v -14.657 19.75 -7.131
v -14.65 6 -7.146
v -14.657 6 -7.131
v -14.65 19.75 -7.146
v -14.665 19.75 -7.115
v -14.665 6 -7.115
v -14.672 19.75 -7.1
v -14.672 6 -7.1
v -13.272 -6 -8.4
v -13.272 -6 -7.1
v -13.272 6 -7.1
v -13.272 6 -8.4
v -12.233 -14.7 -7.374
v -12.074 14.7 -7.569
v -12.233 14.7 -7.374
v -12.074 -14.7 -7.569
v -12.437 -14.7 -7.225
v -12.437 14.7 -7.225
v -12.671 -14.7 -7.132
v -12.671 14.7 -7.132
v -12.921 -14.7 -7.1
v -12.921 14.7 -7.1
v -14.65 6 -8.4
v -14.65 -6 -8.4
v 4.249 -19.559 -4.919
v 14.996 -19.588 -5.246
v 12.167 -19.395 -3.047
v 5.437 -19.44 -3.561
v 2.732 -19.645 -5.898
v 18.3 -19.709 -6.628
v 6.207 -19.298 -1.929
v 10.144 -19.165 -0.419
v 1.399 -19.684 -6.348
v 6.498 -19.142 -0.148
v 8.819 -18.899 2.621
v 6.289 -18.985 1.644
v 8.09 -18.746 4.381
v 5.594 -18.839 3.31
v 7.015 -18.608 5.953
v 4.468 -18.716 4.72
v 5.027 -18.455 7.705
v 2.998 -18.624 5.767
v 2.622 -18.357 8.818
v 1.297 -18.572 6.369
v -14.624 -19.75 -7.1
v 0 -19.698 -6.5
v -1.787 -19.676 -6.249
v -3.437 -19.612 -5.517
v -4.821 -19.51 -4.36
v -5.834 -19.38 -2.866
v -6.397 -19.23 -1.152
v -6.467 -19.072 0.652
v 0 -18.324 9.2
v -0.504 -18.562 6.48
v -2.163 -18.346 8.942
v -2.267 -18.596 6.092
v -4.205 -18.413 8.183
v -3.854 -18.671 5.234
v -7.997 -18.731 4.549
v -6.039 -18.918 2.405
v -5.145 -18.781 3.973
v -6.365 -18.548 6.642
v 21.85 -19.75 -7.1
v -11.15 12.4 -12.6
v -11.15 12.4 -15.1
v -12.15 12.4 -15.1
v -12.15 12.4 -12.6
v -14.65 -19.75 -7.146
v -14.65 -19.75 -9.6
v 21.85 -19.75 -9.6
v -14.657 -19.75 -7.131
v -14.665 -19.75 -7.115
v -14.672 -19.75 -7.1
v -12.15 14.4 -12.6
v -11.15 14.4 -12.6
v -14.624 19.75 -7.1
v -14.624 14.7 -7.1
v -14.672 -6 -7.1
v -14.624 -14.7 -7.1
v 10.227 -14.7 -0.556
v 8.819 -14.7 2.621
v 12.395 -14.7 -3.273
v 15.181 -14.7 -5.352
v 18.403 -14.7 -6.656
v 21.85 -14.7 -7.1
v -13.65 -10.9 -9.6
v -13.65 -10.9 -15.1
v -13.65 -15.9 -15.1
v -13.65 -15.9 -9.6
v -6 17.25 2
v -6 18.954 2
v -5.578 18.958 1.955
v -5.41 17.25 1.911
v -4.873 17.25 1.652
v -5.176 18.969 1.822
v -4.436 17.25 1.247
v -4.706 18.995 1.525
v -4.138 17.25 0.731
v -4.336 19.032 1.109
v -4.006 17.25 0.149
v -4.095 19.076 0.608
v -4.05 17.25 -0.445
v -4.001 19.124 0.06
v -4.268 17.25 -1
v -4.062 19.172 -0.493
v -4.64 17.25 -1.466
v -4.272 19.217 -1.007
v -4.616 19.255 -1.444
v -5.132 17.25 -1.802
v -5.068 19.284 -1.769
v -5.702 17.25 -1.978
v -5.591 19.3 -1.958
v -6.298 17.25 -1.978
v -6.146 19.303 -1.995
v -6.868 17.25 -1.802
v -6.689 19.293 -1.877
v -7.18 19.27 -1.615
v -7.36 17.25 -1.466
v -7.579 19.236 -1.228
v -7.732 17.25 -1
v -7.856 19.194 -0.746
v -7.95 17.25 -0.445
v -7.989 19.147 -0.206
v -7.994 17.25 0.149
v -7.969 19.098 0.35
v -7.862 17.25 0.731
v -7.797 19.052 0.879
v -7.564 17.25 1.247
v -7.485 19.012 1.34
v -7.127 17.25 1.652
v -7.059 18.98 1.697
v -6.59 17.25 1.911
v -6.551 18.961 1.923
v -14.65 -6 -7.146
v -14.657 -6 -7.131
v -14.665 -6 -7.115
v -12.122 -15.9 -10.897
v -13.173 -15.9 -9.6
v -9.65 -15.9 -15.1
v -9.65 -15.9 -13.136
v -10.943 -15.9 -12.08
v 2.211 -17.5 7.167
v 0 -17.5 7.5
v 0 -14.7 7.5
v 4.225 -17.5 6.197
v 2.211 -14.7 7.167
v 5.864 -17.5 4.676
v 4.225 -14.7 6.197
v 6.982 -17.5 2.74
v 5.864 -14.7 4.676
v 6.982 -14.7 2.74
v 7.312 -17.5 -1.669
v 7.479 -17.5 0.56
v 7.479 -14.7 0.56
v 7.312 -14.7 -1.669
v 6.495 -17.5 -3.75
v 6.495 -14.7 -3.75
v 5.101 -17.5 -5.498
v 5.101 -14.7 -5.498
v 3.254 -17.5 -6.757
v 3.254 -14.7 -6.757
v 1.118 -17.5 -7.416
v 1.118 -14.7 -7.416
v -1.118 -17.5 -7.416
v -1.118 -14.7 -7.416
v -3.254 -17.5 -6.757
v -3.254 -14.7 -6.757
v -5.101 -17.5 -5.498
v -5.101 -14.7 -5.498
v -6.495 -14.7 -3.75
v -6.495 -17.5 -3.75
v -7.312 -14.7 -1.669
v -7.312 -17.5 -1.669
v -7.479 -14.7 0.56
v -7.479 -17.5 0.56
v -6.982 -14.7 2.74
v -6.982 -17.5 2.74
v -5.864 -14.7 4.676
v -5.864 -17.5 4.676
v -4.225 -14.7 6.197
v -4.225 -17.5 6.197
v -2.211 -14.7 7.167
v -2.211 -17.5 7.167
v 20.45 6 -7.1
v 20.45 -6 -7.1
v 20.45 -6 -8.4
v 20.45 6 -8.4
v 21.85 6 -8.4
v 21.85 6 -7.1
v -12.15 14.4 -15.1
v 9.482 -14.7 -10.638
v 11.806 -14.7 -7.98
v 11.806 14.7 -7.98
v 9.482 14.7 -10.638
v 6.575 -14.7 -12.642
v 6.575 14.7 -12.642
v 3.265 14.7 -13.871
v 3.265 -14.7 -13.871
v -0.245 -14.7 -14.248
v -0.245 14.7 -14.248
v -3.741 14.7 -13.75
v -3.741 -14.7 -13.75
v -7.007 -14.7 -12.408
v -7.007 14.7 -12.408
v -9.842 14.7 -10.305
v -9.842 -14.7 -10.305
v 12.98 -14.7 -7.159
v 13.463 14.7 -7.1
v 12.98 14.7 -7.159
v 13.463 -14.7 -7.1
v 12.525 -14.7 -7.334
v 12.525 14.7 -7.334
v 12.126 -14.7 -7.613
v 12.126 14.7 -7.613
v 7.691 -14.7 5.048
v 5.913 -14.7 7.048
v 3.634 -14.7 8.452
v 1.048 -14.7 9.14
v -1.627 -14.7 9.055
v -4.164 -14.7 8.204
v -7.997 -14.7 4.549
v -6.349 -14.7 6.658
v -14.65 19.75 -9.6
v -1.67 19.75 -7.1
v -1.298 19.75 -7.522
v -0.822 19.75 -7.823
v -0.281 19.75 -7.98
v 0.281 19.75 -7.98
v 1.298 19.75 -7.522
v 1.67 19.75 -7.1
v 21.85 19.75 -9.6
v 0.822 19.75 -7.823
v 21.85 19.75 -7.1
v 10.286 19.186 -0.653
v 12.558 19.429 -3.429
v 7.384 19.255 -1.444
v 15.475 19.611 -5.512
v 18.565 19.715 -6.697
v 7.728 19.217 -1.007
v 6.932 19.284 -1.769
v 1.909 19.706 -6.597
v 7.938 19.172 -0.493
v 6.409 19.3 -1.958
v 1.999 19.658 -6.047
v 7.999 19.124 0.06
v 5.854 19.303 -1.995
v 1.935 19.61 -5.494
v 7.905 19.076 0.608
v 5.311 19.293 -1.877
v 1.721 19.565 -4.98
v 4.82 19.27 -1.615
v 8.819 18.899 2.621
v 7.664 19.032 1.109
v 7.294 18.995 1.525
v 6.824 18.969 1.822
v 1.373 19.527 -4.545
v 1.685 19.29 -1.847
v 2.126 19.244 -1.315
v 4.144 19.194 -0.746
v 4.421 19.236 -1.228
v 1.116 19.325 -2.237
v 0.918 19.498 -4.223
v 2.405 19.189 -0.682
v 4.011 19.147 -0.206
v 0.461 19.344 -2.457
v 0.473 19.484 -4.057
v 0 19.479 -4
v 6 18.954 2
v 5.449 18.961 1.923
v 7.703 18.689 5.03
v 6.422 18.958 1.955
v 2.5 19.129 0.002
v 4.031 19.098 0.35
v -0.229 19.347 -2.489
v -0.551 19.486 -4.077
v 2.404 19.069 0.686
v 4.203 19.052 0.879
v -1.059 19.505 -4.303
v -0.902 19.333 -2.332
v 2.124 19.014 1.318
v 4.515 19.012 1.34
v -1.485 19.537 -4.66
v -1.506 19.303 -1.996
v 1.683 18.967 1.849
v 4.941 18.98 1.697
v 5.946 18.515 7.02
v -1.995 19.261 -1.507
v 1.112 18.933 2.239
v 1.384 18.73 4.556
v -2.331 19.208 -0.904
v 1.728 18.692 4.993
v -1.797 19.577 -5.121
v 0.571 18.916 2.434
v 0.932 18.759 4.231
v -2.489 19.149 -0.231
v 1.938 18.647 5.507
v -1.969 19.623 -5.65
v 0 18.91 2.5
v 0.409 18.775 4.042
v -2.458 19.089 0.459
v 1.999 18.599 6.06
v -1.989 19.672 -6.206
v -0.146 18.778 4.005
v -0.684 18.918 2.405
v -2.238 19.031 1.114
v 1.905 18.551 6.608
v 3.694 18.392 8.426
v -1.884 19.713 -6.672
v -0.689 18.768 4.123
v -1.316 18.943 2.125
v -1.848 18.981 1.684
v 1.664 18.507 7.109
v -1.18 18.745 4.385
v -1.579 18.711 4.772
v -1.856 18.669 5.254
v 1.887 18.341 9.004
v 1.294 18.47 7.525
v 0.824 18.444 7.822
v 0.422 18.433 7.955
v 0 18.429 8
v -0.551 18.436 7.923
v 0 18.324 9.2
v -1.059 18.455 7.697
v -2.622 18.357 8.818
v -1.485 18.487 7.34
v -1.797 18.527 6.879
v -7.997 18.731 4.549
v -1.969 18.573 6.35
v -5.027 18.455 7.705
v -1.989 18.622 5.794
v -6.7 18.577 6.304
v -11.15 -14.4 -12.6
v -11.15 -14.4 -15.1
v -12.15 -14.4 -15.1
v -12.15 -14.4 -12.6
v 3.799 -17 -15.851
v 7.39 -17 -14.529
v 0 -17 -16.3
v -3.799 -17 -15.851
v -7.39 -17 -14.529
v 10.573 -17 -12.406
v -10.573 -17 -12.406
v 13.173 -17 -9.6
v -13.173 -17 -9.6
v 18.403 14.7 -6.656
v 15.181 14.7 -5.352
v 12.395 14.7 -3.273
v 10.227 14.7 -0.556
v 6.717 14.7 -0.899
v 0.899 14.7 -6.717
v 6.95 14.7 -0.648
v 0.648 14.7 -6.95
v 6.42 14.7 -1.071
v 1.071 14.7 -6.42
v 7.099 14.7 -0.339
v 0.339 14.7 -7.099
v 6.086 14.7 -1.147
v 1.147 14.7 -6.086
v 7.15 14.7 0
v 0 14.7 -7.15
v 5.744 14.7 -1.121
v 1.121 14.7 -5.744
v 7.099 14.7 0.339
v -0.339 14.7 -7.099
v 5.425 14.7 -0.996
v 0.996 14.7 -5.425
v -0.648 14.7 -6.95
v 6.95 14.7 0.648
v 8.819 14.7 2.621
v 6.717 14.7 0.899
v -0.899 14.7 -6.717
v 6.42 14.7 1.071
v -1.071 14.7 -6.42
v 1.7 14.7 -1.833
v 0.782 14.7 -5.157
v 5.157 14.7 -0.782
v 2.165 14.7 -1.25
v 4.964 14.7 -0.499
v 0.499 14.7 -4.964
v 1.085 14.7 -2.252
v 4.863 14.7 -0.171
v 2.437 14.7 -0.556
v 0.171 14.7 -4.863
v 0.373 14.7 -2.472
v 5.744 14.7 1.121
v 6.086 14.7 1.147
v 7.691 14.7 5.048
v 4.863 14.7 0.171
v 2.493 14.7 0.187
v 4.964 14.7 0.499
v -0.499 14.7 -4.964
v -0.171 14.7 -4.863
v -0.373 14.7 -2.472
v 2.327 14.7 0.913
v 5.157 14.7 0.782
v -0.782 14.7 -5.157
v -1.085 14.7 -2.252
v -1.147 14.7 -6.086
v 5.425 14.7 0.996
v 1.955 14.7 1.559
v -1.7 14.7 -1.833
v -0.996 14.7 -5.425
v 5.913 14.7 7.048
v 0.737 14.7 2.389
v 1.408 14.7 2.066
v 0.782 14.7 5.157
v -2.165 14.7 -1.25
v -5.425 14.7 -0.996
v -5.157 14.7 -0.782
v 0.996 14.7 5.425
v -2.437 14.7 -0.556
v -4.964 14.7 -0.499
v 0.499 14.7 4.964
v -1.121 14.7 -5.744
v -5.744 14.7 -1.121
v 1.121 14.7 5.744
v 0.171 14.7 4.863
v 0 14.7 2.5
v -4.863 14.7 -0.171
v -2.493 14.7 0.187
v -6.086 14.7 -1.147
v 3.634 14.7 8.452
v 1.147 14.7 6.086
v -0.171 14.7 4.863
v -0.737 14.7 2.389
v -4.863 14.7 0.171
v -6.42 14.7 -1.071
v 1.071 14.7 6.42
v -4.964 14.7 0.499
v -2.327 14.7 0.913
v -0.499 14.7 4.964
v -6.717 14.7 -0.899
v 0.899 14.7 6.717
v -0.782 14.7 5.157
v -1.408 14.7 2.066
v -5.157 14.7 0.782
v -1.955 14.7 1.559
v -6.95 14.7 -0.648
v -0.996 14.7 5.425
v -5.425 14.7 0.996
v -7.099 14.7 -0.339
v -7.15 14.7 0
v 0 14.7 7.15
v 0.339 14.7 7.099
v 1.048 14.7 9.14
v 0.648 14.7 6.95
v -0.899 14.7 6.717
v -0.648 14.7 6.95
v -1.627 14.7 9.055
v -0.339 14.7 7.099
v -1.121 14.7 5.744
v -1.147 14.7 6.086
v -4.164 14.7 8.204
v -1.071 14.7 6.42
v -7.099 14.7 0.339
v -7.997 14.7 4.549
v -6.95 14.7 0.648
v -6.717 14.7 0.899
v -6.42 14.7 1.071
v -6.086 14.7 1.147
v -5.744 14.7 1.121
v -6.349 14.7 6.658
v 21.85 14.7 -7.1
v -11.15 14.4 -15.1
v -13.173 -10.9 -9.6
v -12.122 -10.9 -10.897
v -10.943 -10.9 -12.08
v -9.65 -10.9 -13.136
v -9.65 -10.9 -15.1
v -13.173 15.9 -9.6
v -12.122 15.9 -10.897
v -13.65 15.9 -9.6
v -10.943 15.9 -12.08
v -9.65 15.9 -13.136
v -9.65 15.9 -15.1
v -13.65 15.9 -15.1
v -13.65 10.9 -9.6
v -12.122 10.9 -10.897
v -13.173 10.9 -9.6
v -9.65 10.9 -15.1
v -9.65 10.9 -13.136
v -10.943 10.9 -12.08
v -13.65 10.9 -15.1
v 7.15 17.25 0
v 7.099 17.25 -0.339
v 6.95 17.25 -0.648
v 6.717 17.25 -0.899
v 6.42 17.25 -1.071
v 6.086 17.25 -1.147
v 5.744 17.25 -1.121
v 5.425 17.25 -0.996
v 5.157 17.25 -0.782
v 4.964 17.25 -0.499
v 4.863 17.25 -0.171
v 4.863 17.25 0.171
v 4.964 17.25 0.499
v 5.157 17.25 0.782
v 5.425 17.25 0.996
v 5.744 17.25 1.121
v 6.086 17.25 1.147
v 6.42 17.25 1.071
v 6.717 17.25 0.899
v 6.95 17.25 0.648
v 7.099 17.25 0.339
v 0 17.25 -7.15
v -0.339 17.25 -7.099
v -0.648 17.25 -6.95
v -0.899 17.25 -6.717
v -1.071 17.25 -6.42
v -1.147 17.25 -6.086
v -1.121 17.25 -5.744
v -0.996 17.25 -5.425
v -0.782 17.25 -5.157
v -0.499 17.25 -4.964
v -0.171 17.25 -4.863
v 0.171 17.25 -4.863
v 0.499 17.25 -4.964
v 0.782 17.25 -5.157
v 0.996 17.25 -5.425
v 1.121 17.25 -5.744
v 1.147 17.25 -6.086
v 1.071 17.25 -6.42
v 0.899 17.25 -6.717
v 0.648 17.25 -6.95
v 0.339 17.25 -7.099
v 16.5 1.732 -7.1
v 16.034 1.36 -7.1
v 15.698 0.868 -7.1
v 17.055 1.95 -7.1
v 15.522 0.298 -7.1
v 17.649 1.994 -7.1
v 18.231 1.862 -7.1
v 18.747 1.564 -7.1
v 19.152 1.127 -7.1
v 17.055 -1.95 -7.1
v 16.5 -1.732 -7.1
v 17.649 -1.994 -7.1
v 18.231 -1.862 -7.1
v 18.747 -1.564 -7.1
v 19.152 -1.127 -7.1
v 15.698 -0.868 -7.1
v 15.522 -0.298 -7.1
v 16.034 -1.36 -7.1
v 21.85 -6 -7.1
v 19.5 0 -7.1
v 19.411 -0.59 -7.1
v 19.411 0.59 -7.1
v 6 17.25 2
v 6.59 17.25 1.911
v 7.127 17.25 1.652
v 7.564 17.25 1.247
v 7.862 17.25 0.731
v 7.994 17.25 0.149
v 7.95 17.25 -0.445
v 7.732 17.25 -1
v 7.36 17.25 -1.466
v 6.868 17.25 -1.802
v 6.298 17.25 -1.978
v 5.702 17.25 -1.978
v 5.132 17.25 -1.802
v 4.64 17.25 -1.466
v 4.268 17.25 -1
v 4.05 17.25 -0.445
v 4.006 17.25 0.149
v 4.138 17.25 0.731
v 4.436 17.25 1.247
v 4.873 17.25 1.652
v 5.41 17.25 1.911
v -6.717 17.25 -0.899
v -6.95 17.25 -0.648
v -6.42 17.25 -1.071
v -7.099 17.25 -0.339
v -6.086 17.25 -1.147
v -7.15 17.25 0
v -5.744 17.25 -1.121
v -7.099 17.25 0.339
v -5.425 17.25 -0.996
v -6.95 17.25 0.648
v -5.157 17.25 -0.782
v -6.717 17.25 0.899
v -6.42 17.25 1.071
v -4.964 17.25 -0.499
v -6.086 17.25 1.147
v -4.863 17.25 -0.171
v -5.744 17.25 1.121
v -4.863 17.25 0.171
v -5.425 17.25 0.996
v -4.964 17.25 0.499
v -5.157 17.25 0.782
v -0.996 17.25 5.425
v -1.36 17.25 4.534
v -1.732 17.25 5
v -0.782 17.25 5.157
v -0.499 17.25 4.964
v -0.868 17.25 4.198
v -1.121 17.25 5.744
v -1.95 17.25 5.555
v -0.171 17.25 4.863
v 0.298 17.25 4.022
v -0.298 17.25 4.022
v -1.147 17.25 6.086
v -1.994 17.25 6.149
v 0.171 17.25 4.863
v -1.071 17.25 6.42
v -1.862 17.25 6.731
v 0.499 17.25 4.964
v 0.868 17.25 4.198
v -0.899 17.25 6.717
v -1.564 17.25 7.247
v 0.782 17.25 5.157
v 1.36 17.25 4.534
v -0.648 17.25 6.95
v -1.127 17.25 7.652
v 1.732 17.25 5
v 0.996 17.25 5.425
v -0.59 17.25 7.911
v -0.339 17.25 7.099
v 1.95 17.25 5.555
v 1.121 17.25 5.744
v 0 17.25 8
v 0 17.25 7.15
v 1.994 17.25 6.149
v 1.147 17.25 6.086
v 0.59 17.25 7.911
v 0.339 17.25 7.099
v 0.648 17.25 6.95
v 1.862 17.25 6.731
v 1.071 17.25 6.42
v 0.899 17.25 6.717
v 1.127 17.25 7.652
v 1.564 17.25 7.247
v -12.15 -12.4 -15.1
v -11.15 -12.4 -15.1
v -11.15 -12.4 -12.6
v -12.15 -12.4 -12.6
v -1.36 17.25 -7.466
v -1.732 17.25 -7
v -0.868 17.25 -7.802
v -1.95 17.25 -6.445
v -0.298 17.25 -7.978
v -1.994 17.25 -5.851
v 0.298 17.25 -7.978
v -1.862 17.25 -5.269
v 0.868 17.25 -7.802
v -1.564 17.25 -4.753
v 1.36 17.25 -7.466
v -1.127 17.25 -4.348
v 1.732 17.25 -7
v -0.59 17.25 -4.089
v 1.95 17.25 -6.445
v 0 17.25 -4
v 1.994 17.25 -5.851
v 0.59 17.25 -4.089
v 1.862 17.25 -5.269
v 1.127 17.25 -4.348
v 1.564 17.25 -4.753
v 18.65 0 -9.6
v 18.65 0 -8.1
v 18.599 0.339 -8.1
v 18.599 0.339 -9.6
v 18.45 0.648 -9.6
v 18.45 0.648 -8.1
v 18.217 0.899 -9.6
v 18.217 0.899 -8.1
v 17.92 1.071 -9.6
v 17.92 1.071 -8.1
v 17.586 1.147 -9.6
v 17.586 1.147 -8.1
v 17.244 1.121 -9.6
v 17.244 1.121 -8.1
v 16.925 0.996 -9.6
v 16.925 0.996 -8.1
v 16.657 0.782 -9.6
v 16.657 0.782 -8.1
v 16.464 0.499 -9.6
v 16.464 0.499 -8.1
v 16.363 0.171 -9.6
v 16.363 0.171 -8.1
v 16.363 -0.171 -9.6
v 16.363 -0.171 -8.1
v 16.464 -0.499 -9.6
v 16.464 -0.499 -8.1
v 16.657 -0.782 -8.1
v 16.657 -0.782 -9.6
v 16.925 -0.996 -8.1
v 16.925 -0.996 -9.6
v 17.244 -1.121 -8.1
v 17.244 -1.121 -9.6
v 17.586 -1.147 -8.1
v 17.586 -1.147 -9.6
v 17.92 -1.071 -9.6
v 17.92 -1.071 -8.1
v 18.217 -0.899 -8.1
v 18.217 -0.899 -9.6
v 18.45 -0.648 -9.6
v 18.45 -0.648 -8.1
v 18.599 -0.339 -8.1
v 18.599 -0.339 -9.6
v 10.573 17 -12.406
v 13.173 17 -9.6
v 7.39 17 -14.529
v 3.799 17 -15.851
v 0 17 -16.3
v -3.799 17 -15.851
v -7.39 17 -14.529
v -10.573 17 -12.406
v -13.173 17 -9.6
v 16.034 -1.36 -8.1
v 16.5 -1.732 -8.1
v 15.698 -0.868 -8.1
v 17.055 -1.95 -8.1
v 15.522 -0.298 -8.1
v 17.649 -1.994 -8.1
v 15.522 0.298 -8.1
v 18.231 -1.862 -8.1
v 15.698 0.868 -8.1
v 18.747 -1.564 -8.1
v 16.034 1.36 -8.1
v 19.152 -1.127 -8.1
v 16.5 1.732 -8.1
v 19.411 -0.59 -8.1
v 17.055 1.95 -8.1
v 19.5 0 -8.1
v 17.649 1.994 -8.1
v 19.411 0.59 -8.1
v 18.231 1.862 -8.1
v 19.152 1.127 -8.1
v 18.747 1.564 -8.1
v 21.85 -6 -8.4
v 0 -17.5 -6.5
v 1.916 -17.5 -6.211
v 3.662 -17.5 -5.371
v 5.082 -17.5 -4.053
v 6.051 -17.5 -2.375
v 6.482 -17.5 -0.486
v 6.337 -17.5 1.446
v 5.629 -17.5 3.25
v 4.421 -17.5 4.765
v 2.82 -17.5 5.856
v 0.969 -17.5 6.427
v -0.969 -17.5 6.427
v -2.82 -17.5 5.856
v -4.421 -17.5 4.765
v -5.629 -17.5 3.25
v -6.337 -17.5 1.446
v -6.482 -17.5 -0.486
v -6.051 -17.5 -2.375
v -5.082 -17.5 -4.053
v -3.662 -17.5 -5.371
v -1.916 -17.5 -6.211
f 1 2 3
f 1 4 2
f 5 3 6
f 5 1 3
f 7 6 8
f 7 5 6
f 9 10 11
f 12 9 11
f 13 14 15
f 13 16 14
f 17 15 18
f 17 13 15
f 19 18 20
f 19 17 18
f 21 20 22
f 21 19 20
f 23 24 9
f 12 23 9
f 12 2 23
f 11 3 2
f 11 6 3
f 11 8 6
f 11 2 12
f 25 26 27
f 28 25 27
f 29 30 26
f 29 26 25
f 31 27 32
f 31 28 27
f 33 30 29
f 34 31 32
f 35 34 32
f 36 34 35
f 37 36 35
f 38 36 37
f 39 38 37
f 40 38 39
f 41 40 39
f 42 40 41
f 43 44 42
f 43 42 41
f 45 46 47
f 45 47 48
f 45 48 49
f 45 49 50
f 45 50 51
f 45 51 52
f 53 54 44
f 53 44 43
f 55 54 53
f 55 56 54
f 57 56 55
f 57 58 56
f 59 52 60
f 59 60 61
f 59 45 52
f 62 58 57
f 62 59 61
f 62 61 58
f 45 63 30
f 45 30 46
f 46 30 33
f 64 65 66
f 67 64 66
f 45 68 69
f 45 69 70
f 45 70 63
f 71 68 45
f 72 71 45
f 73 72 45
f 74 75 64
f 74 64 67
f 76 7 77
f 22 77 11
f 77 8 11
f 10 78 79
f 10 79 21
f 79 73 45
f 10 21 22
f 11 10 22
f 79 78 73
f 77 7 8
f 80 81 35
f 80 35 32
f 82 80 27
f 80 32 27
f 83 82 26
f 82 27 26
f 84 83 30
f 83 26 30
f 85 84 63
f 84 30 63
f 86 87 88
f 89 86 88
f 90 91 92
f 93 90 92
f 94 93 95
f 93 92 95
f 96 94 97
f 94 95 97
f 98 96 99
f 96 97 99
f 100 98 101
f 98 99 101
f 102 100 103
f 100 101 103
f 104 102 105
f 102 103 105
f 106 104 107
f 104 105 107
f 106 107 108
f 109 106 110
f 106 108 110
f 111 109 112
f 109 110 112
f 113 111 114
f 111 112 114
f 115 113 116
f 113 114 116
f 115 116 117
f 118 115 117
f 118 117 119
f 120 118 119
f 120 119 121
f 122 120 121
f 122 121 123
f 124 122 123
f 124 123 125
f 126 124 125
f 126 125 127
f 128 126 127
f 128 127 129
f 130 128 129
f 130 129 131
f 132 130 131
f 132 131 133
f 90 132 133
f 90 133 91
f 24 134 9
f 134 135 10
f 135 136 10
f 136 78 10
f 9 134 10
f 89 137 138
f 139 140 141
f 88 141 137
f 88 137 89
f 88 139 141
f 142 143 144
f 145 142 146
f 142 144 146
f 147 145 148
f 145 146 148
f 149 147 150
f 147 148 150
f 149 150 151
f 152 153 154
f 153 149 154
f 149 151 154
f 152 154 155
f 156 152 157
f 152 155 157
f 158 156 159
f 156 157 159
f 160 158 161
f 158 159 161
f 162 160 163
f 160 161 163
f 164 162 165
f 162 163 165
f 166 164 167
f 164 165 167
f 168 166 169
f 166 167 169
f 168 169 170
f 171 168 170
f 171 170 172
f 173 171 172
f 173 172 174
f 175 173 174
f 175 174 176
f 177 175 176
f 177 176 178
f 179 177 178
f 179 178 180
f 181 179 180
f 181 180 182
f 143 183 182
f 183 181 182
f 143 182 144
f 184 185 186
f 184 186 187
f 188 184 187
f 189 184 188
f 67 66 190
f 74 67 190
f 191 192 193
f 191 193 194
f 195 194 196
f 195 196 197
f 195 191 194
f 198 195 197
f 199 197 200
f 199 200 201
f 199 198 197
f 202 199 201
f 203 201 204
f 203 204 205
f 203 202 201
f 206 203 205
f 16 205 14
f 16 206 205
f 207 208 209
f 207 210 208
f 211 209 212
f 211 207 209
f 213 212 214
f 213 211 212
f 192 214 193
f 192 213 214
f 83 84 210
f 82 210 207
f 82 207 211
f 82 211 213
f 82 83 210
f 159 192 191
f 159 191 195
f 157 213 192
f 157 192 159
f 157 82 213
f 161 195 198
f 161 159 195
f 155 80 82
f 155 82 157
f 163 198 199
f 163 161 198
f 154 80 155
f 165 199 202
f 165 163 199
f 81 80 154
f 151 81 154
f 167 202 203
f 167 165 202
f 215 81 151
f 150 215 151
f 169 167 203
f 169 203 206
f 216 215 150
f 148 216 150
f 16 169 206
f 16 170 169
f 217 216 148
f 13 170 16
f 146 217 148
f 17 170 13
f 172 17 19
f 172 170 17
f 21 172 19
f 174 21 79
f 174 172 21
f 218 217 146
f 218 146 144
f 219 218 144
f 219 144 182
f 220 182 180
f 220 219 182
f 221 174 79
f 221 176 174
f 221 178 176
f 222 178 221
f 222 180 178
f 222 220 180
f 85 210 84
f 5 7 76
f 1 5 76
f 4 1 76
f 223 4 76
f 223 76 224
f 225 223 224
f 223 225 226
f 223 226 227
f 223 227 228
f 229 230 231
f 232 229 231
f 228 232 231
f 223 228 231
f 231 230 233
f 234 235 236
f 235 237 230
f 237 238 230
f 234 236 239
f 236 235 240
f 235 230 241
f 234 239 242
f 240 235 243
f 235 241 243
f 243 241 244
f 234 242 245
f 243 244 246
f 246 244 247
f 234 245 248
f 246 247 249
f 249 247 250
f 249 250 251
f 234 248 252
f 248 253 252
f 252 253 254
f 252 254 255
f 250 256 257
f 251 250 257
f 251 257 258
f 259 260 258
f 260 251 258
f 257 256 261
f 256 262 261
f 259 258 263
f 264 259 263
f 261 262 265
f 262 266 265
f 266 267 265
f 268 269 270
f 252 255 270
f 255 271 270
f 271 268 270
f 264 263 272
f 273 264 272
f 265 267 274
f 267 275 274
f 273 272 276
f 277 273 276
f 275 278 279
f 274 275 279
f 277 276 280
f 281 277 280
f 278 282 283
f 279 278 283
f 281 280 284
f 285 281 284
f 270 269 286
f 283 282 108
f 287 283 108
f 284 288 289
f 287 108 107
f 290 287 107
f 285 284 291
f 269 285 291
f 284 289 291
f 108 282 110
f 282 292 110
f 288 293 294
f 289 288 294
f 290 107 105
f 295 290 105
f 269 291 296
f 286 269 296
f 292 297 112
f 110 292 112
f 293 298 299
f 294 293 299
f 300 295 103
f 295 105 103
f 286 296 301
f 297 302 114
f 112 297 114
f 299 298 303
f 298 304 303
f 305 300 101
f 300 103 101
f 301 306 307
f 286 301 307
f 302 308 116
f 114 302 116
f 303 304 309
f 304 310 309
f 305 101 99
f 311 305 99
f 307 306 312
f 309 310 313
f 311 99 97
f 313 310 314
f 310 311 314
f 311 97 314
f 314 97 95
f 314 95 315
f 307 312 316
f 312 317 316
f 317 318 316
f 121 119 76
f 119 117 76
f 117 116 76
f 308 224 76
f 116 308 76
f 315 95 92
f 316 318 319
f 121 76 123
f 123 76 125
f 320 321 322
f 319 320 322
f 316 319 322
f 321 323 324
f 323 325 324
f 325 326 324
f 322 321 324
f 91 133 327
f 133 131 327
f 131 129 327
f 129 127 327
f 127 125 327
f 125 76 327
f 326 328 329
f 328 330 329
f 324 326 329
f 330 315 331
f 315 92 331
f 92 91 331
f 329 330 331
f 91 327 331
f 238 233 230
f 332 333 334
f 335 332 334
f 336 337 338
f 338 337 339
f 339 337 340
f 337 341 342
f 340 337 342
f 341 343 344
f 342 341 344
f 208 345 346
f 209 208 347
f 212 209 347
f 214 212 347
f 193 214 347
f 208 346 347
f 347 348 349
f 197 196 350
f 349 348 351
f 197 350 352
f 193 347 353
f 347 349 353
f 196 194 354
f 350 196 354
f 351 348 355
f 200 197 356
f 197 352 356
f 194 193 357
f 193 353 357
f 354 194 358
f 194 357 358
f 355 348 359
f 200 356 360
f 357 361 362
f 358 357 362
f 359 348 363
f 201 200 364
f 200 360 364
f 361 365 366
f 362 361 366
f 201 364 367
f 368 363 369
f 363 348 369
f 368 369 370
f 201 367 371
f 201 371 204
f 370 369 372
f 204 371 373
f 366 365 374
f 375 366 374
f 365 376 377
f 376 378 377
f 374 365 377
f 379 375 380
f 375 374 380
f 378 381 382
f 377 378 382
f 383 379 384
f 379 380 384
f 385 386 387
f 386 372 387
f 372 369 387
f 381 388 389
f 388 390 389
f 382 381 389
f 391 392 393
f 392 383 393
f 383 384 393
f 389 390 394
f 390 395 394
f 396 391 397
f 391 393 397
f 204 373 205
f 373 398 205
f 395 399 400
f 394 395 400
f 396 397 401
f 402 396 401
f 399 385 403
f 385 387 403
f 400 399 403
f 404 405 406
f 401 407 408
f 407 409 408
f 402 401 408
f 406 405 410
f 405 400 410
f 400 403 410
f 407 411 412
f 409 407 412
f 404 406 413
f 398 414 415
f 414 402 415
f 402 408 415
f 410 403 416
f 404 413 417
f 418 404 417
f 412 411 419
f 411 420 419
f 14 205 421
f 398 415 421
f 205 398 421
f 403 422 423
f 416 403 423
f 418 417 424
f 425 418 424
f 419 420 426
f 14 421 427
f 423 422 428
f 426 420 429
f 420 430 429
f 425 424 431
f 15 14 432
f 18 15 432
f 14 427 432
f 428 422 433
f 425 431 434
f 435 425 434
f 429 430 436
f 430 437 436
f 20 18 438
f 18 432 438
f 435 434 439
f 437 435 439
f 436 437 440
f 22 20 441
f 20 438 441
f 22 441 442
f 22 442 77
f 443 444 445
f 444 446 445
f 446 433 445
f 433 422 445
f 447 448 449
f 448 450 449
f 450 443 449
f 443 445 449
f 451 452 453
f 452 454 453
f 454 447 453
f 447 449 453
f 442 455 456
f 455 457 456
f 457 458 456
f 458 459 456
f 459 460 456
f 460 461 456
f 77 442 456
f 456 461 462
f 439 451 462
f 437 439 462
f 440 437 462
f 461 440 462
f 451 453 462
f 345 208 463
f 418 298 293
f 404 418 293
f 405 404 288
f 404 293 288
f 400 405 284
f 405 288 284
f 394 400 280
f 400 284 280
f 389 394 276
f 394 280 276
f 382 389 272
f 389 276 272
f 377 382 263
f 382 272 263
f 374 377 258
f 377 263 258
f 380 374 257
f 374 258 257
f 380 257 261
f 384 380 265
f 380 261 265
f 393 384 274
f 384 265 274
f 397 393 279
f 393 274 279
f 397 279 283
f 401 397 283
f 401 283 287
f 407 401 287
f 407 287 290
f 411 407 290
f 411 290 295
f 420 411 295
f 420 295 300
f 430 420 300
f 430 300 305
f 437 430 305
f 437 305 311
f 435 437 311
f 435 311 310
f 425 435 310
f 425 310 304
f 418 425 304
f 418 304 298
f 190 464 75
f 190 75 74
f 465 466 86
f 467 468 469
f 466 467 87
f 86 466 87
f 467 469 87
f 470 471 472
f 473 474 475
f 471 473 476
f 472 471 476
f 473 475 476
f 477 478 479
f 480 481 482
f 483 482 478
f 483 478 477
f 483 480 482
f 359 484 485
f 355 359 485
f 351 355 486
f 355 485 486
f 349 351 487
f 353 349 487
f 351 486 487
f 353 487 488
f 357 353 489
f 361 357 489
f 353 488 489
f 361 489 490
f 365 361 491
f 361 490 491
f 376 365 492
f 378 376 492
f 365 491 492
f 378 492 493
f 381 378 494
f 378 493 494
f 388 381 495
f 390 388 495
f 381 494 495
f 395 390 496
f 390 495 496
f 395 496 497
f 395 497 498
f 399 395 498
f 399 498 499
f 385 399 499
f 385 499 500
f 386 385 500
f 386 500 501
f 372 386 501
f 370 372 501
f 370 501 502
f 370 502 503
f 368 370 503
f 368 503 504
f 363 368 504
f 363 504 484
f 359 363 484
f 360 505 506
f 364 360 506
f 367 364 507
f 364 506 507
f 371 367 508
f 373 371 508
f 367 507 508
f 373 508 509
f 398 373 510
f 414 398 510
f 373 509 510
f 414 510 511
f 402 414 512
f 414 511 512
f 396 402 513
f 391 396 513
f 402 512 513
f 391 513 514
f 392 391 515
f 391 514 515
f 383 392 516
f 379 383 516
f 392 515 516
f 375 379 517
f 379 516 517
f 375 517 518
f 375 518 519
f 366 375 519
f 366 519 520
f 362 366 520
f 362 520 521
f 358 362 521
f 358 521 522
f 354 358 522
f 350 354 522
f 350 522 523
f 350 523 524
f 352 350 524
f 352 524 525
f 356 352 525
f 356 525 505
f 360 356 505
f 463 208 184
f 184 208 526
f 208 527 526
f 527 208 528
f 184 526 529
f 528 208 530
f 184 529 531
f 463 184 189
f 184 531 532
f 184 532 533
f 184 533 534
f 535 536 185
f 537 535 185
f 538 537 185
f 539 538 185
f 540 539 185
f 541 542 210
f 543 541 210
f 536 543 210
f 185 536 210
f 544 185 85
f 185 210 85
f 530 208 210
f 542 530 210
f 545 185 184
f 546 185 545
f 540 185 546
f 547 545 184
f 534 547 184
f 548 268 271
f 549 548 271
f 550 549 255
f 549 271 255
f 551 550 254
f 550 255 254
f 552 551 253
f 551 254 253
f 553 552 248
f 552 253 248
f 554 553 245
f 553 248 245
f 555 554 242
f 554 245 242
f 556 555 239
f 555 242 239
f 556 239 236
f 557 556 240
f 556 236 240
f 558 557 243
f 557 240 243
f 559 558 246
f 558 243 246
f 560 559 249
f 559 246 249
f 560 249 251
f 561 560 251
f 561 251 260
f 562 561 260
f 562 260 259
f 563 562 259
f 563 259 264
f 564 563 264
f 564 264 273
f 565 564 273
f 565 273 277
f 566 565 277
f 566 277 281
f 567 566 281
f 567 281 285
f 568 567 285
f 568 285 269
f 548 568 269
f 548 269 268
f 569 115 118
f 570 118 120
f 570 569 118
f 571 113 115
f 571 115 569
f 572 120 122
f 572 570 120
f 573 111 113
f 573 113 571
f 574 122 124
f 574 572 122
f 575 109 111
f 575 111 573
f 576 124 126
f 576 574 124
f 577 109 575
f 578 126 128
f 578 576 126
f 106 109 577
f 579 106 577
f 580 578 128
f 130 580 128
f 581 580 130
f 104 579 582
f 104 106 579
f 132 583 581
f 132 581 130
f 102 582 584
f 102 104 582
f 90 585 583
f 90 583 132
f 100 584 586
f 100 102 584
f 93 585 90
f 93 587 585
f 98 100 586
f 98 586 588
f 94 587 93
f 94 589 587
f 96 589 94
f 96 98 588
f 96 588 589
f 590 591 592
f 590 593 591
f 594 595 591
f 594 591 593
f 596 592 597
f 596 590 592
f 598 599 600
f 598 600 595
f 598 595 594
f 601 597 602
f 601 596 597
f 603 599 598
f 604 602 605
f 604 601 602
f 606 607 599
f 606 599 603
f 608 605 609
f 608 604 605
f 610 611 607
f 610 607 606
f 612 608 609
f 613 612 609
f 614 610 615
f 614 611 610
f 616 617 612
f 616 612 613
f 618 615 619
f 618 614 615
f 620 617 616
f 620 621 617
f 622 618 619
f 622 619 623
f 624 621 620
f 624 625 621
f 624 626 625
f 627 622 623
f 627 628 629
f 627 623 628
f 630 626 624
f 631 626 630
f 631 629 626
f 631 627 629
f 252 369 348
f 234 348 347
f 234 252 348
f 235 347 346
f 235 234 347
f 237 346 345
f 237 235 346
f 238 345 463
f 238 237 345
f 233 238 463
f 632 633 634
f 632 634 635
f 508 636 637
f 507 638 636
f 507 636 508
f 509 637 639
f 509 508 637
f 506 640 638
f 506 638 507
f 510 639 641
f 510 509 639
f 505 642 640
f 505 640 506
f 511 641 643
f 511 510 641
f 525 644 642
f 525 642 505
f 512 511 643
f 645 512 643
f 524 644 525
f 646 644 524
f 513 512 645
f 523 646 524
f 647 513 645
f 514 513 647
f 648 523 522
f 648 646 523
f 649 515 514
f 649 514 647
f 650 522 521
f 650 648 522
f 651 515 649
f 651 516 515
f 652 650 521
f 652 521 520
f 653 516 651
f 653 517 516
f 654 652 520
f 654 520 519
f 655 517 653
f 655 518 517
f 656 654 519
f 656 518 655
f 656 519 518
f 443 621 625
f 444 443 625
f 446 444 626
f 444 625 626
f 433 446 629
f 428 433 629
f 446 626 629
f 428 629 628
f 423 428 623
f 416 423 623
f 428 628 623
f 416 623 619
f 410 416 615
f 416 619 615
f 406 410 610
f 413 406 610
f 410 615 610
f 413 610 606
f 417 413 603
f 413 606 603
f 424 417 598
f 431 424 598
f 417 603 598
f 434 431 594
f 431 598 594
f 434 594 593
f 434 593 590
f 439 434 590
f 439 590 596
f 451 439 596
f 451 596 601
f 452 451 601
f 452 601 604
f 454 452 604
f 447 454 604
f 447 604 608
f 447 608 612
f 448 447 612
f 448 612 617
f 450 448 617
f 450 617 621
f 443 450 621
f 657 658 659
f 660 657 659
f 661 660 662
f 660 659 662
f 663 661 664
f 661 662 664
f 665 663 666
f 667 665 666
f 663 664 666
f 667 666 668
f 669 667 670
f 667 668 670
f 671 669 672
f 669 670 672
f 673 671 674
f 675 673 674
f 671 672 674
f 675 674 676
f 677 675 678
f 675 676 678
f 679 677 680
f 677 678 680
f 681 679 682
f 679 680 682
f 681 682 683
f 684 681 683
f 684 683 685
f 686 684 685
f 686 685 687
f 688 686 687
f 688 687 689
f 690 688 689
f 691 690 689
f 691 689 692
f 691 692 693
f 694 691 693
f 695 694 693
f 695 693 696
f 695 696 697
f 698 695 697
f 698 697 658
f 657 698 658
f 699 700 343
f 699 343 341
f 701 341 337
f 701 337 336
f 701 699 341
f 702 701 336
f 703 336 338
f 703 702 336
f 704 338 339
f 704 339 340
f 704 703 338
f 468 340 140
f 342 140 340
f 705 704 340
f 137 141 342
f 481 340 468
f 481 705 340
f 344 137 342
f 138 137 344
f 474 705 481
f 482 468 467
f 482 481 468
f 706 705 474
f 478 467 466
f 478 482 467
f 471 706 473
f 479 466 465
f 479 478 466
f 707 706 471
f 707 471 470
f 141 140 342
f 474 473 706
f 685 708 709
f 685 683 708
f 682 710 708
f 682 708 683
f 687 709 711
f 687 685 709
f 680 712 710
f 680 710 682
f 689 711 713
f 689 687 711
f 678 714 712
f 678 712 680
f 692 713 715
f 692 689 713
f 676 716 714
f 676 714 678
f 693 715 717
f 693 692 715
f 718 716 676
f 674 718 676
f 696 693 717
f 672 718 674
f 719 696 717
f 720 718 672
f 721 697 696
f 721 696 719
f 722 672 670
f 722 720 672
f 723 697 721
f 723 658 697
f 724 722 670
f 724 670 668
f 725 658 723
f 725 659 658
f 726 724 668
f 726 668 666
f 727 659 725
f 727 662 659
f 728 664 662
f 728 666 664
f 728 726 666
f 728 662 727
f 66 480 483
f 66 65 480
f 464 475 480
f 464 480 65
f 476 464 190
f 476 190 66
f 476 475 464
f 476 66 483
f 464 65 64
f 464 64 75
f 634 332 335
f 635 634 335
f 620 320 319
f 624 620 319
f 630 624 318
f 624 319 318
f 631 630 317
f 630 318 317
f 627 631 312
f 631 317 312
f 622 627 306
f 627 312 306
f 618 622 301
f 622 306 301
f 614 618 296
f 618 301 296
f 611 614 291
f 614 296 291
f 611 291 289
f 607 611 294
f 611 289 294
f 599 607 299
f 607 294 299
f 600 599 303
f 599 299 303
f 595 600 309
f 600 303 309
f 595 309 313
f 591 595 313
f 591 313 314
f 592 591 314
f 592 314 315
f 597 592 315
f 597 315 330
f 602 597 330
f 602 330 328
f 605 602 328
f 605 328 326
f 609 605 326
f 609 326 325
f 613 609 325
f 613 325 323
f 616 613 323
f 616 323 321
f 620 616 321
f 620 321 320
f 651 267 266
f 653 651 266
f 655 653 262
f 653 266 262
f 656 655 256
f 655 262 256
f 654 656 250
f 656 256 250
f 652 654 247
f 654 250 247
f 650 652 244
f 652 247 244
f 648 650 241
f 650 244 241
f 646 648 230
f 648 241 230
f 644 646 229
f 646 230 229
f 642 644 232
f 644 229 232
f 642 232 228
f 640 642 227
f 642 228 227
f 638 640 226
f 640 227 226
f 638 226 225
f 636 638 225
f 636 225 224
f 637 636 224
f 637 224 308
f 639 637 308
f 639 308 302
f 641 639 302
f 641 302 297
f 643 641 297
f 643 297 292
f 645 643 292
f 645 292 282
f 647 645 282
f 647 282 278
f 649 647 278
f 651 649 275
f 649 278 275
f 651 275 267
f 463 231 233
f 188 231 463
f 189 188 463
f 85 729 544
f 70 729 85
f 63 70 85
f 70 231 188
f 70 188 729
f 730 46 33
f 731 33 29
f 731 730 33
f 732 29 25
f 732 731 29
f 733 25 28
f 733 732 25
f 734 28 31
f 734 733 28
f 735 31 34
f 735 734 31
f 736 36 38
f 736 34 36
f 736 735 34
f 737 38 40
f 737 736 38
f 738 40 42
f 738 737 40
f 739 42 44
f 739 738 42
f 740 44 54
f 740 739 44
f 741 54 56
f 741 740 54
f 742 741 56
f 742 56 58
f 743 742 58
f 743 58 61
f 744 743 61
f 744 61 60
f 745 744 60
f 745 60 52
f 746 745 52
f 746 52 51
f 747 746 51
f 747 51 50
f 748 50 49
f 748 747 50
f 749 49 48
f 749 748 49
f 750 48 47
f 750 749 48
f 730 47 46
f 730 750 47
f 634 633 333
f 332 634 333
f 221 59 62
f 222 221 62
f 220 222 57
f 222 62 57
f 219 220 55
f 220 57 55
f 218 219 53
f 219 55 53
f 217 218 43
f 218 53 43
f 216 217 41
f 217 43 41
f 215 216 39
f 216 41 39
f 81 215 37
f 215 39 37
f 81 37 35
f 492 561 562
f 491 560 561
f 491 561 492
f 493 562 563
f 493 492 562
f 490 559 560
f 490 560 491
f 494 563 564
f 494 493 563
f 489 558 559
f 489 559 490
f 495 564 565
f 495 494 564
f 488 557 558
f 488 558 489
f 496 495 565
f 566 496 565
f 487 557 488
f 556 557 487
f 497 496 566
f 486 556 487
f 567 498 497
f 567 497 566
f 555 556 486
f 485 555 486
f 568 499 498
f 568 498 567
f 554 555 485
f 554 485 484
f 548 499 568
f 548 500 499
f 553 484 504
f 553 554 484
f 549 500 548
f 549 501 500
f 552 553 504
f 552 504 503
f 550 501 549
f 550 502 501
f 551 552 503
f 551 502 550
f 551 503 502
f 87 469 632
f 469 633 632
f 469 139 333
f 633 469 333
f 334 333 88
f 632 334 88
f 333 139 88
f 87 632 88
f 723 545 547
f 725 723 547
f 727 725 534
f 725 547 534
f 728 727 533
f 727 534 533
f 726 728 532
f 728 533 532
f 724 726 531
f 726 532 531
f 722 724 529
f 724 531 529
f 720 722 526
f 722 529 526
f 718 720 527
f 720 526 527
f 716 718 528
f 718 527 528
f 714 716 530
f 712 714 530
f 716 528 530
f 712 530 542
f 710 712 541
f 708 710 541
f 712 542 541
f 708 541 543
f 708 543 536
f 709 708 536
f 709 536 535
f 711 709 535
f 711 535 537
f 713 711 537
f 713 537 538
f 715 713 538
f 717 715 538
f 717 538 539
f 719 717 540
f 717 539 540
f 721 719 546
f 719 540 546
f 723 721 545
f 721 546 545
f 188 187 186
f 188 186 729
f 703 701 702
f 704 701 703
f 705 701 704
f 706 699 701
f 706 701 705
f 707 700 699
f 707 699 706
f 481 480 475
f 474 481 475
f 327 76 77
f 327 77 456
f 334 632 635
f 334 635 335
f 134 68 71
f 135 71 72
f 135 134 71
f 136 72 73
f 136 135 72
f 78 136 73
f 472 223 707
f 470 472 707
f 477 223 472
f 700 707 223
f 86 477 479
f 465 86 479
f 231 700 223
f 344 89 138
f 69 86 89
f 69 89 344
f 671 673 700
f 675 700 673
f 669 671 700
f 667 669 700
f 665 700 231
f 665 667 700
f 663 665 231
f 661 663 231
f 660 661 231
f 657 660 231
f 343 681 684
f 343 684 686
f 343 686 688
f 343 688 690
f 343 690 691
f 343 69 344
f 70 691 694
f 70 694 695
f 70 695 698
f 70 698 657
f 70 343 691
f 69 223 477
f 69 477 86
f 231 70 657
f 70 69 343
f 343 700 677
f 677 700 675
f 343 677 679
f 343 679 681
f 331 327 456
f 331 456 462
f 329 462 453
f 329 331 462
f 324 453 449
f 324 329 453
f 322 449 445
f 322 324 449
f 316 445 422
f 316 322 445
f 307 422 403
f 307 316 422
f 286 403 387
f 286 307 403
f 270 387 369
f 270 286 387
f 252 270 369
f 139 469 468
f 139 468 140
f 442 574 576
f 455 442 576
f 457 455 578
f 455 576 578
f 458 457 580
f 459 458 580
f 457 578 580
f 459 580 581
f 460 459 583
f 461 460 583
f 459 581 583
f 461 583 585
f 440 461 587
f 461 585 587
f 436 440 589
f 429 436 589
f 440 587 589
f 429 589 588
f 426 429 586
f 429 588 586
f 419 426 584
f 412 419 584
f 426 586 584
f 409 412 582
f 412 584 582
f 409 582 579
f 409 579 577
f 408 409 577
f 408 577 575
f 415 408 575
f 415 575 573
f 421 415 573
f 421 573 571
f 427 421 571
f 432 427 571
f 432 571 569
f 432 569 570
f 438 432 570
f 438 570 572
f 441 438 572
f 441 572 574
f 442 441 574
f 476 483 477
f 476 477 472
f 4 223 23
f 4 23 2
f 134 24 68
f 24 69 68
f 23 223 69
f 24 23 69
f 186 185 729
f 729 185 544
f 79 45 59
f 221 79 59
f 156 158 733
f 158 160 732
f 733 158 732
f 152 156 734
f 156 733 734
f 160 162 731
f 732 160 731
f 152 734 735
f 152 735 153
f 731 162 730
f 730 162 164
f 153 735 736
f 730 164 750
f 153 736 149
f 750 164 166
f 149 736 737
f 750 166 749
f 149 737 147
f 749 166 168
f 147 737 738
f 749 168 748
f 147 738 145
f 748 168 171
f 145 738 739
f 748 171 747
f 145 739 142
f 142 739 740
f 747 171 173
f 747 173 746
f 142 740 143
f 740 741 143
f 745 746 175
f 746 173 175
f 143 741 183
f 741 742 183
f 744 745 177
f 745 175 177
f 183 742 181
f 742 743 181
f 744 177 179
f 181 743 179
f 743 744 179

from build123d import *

# Parameters (mm, degrees)
SKETCH_1_R               = 16.3
EXTRUDE_1_DEPTH          = 19.75
SKETCH_2_W               = 36.5
SKETCH_2_H               = 2.5
EXTRUDE_2_DEPTH          = 39.5
SKETCH_3_W               = 44.844436064
SKETCH_3_H               = 25.506740045
CUT_EXTRUDE_1_DEPTH      = 50
EXTRUDE_3_DEPTH          = 5.05
SKETCH_5_R               = 14.25
CUT_EXTRUDE_2_DEPTH      = 29.4
SKETCH_6_R               = 7.5
CUT_EXTRUDE_3_DEPTH      = 44.930797853
SKETCH_8_R               = 1.15
CUT_EXTRUDE_5_DEPTH      = 5.05
PATTERN_CIRCULAR_1_COUNT = 4
CUT_EXTRUDE_6_REACH      = 49.993
SKETCH_9_R               = 2.5
SKETCH_10_R              = 2
CUT_EXTRUDE_7_DEPTH      = 2.5
EXTRUDE_START            = -2.25
SKETCH_11_R              = 7.5
SKETCH_11_R_2            = 6.5
EXTRUDE_4_DEPTH          = 2.25
SKETCH_12_R              = 1.15
CUT_EXTRUDE_9_DEPTH      = 34.662664779
SKETCH_13_R              = 2
CUT_EXTRUDE_10_DEPTH     = 1
SKETCH_14_W              = 2.8
SKETCH_14_H              = 12
CUT_EXTRUDE_11_DEPTH     = 1.3
SKETCH_15_W              = 2.8
SKETCH_15_H              = 12
CUT_EXTRUDE_12_DEPTH     = 1.3
EXTRUDE_5_REACH          = 40.183
EXTRUDE_5_END_RADIUS     = 16.3
SKETCH_16_W              = 4
SKETCH_16_H              = 5
SKETCH_17_W              = 1
SKETCH_17_H              = 2
CUT_EXTRUDE_13_DEPTH     = 2.5
CUT_EXTRUDE_8_DEPTH      = 45.587021654
SKETCH_18_W              = 26.346157216
SKETCH_18_H              = 2.75
CUT_EXTRUDE_16_DEPTH     = 12.5
FILLET_1_R               = 2
FILLET_2_R               = 1


with BuildPart() as part:
    # 草图1 → 凸台-拉伸1 (new, symmetric)
    with BuildSketch(Plane(origin=(0, 0, 0), x_dir=(1, 0, 0), z_dir=(0, 1, 0))):
        with Locations(Location((0, 0, 0), (0, 0, 270))):
            Circle(SKETCH_1_R)
    extrude(amount=EXTRUDE_1_DEPTH, both=True)

    # 草图2 → 凸台-拉伸2 (add, through all)
    with BuildSketch(Plane.XZ.offset(19.75)):
        with Locations((3.6, -8.35)):
            Rectangle(SKETCH_2_W, SKETCH_2_H)
    extrude(amount=-EXTRUDE_2_DEPTH)

    # 草图3 → 切除-拉伸1 (cut)
    with BuildSketch(Plane.XZ.offset(19.75)):
        with Locations((-0.572218032, 5.653370022)):
            Rectangle(SKETCH_3_W, SKETCH_3_H)
    extrude(amount=-CUT_EXTRUDE_1_DEPTH, mode=Mode.SUBTRACT)

    # 草图4 → 凸台-拉伸3 (add)
    with BuildSketch(Plane.XZ.offset(19.75)):
        with BuildLine():
            Line((-14.65, -7.146152811), (-7.996542478, 4.549209646))
            ThreePointArc((-7.996542478, 4.549209646), (1.047927533, 9.140122969), (8.818653972, 2.621324497))
            ThreePointArc((8.818653972, 2.621324497), (13.721037439, -4.401937543), (21.85, -7.1))
            Line((21.85, -7.1), (-14.65, -7.146152811))
        make_face()
    extrude_3 = extrude(amount=-EXTRUDE_3_DEPTH)

    # 镜向1: 凸台-拉伸3 across plane
    add(extrude_3.mirror(Plane.ZX))

    # 草图5 → 切除-拉伸2 (cut)
    with BuildSketch(Plane(origin=(0, -14.7, 0), x_dir=(1, 0, 0), z_dir=(0, 1, 0))):
        Circle(SKETCH_5_R)
    extrude(amount=CUT_EXTRUDE_2_DEPTH, mode=Mode.SUBTRACT)

    # 草图6 → 切除-拉伸3 (cut, through all)
    with BuildSketch(Plane(origin=(0, -14.7, 0), x_dir=(1, 0, 0), z_dir=(0, 1, 0))):
        with Locations(Location((0, 0, 0), (0, 0, 270))):
            Circle(SKETCH_6_R)
    extrude(amount=-CUT_EXTRUDE_3_DEPTH, mode=Mode.SUBTRACT)

    # 草图8 → 切除-拉伸5 (cut)
    with BuildSketch(Plane(origin=(0, 19.75, 0), x_dir=(1, 0, 0), z_dir=(0, 1, 0))):
        with Locations(Location((0, -6, 0), (0, 0, 270))):
            Circle(SKETCH_8_R)
    cut_extrude_5 = extrude(amount=-CUT_EXTRUDE_5_DEPTH, mode=Mode.SUBTRACT)

    # 阵列(圆周)1: 切除-拉伸5 ×4 about axis
    pattern_circular_1_axis = Axis((0, 0, 0), (0, 1, 0))
    for i in range(1, PATTERN_CIRCULAR_1_COUNT):
        add(cut_extrude_5.rotate(pattern_circular_1_axis, i * 360 / PATTERN_CIRCULAR_1_COUNT), mode=Mode.SUBTRACT)

    # 草图9 → 切除-拉伸6 (cut, up to next)
    with BuildSketch(Plane(origin=(0, 19.75, 0), x_dir=(1, 0, 0), z_dir=(0, 1, 0)), mode=Mode.PRIVATE) as cut_extrude_6_sk1:
        with Locations(Location((0, 0, 0), (0, 0, 270))):
            Circle(SKETCH_9_R)
    cut_extrude_6_tool1 = extrude(cut_extrude_6_sk1.sketch, amount=-CUT_EXTRUDE_6_REACH, mode=Mode.PRIVATE) & part.part
    add(cut_extrude_6_tool1.solids().sort_by_distance((0, 19.75, 0))[0], mode=Mode.SUBTRACT)

    # 草图10 → 切除-拉伸7 (cut)
    with BuildSketch(Plane(origin=(0, 19.75, 0), x_dir=(1, 0, 0), z_dir=(0, 1, 0))):
        with Locations(Location((0, 6, 0), (0, 0, 270))):
            Circle(SKETCH_10_R)
        with Locations(Location((6, 0, 0), (0, 0, 270))):
            Circle(SKETCH_10_R)
        with Locations(Location((-6, 0, 0), (0, 0, 270))):
            Circle(SKETCH_10_R)
        with Locations(Location((0, -6, 0), (0, 0, 270))):
            Circle(SKETCH_10_R)
    extrude(amount=-CUT_EXTRUDE_7_DEPTH, mode=Mode.SUBTRACT)

    # 草图11 → 凸台-拉伸4 (add)
    with BuildSketch(Plane.XZ.offset(19.75).offset(EXTRUDE_START)):
        with Locations(Location((0, 0, 0), (0, 0, 90))):
            Circle(SKETCH_11_R)
        with Locations(Location((0, 0, 0), (0, 0, 270))):
            Circle(SKETCH_11_R_2, mode=Mode.SUBTRACT)
    extrude(amount=EXTRUDE_4_DEPTH)

    # 草图12 → 切除-拉伸9 (cut, through all)
    with BuildSketch(Plane.XY.offset(-7.1)):
        with Locations((17.5, 0)):
            Circle(SKETCH_12_R)
    extrude(amount=-CUT_EXTRUDE_9_DEPTH, mode=Mode.SUBTRACT)

    # 草图13 → 切除-拉伸10 (cut)
    with BuildSketch(Plane.XY.offset(-7.1)):
        with Locations((17.5, 0)):
            Circle(SKETCH_13_R)
    extrude(amount=-CUT_EXTRUDE_10_DEPTH, mode=Mode.SUBTRACT)

    # 草图14 → 切除-拉伸11 (cut)
    with BuildSketch(Plane.XY.offset(-7.1)):
        with Locations((21.85, 0)):
            Rectangle(SKETCH_14_W, SKETCH_14_H)
    extrude(amount=-CUT_EXTRUDE_11_DEPTH, mode=Mode.SUBTRACT)

    # 草图15 → 切除-拉伸12 (cut)
    with BuildSketch(Plane.XY.offset(-7.1)):
        with Locations((-14.672423113, 0)):
            Rectangle(SKETCH_15_W, SKETCH_15_H)
    extrude(amount=-CUT_EXTRUDE_12_DEPTH, mode=Mode.SUBTRACT)

    # 凸台-拉伸5: up to this cylinder (the profile starts outside it)
    extrude_5_end = Plane(origin=(0, 13.4, 0), z_dir=(0, -1, 0)) * Cylinder(EXTRUDE_5_END_RADIUS, 113.966, mode=Mode.PRIVATE)
    # 草图16 → 凸台-拉伸5 (add, up to the surface)
    with BuildSketch(Plane(origin=(0, 0, -15.1), x_dir=(-1, 0, 0), z_dir=(0, 0, -1)), mode=Mode.PRIVATE) as extrude_5_sk1:
        with Locations((11.65, 13.4)):
            Rectangle(SKETCH_16_W, SKETCH_16_H)
    extrude_5_tool1 = extrude(extrude_5_sk1.sketch, amount=-EXTRUDE_5_REACH, mode=Mode.PRIVATE) - extrude_5_end
    extrude_5 = extrude_5_tool1.solids().sort_by_distance((-11.65, 13.4, -15.1))[0]
    add(extrude_5)

    # 镜向4: 凸台-拉伸5 across plane
    add(extrude_5.mirror(Plane.ZX))

    # 草图17 → 切除-拉伸13 (cut)
    with BuildSketch(Plane(origin=(0, 0, -15.1), x_dir=(-1, 0, 0), z_dir=(0, 0, -1))):
        with Locations((11.65, 13.4)):
            Rectangle(SKETCH_17_W, SKETCH_17_H)
    cut_extrude_13 = extrude(amount=-CUT_EXTRUDE_13_DEPTH, mode=Mode.SUBTRACT)

    # 镜向5: 切除-拉伸13 across plane
    add(cut_extrude_13.mirror(Plane.ZX), mode=Mode.SUBTRACT)

    # 草图7 → 切除-拉伸8 (cut, through all)
    with BuildSketch(Plane.ZY.offset(14.65)):
        Polygon((-7.1, 19.75), (9.2, 18.323934785), (9.2, 19.75), align=None)
    cut_extrude_8 = extrude(amount=-CUT_EXTRUDE_8_DEPTH, mode=Mode.SUBTRACT)

    # 镜向3: 切除-拉伸8 across plane
    add(cut_extrude_8.mirror(Plane.ZX), mode=Mode.SUBTRACT)

    # 草图18 → 切除-拉伸16 (cut)
    with BuildSketch(Plane(origin=(0, 0, -9.6), x_dir=(-1, 0, 0), z_dir=(0, 0, -1))):
        with Locations((0, 18.375)):
            Rectangle(SKETCH_18_W, SKETCH_18_H)
    cut_extrude_16 = extrude(amount=CUT_EXTRUDE_16_DEPTH, mode=Mode.SUBTRACT)

    # 镜向6: 切除-拉伸16 across plane
    add(cut_extrude_16.mirror(Plane.ZX), mode=Mode.SUBTRACT)

    # 圆角1
    fillet_1_edges = [part.edges().sort_by_distance(p)[0] for p in [
        (12.355262037, 0, -7.1),
    ]]
    fillet(fillet_1_edges, radius=FILLET_1_R)

    # 圆角2
    fillet_2_edges = [part.edges().sort_by_distance(p)[0] for p in [
        (-12.355262037, 0, -7.1),
    ]]
    fillet(fillet_2_edges, radius=FILLET_2_R)


solid = part.part
